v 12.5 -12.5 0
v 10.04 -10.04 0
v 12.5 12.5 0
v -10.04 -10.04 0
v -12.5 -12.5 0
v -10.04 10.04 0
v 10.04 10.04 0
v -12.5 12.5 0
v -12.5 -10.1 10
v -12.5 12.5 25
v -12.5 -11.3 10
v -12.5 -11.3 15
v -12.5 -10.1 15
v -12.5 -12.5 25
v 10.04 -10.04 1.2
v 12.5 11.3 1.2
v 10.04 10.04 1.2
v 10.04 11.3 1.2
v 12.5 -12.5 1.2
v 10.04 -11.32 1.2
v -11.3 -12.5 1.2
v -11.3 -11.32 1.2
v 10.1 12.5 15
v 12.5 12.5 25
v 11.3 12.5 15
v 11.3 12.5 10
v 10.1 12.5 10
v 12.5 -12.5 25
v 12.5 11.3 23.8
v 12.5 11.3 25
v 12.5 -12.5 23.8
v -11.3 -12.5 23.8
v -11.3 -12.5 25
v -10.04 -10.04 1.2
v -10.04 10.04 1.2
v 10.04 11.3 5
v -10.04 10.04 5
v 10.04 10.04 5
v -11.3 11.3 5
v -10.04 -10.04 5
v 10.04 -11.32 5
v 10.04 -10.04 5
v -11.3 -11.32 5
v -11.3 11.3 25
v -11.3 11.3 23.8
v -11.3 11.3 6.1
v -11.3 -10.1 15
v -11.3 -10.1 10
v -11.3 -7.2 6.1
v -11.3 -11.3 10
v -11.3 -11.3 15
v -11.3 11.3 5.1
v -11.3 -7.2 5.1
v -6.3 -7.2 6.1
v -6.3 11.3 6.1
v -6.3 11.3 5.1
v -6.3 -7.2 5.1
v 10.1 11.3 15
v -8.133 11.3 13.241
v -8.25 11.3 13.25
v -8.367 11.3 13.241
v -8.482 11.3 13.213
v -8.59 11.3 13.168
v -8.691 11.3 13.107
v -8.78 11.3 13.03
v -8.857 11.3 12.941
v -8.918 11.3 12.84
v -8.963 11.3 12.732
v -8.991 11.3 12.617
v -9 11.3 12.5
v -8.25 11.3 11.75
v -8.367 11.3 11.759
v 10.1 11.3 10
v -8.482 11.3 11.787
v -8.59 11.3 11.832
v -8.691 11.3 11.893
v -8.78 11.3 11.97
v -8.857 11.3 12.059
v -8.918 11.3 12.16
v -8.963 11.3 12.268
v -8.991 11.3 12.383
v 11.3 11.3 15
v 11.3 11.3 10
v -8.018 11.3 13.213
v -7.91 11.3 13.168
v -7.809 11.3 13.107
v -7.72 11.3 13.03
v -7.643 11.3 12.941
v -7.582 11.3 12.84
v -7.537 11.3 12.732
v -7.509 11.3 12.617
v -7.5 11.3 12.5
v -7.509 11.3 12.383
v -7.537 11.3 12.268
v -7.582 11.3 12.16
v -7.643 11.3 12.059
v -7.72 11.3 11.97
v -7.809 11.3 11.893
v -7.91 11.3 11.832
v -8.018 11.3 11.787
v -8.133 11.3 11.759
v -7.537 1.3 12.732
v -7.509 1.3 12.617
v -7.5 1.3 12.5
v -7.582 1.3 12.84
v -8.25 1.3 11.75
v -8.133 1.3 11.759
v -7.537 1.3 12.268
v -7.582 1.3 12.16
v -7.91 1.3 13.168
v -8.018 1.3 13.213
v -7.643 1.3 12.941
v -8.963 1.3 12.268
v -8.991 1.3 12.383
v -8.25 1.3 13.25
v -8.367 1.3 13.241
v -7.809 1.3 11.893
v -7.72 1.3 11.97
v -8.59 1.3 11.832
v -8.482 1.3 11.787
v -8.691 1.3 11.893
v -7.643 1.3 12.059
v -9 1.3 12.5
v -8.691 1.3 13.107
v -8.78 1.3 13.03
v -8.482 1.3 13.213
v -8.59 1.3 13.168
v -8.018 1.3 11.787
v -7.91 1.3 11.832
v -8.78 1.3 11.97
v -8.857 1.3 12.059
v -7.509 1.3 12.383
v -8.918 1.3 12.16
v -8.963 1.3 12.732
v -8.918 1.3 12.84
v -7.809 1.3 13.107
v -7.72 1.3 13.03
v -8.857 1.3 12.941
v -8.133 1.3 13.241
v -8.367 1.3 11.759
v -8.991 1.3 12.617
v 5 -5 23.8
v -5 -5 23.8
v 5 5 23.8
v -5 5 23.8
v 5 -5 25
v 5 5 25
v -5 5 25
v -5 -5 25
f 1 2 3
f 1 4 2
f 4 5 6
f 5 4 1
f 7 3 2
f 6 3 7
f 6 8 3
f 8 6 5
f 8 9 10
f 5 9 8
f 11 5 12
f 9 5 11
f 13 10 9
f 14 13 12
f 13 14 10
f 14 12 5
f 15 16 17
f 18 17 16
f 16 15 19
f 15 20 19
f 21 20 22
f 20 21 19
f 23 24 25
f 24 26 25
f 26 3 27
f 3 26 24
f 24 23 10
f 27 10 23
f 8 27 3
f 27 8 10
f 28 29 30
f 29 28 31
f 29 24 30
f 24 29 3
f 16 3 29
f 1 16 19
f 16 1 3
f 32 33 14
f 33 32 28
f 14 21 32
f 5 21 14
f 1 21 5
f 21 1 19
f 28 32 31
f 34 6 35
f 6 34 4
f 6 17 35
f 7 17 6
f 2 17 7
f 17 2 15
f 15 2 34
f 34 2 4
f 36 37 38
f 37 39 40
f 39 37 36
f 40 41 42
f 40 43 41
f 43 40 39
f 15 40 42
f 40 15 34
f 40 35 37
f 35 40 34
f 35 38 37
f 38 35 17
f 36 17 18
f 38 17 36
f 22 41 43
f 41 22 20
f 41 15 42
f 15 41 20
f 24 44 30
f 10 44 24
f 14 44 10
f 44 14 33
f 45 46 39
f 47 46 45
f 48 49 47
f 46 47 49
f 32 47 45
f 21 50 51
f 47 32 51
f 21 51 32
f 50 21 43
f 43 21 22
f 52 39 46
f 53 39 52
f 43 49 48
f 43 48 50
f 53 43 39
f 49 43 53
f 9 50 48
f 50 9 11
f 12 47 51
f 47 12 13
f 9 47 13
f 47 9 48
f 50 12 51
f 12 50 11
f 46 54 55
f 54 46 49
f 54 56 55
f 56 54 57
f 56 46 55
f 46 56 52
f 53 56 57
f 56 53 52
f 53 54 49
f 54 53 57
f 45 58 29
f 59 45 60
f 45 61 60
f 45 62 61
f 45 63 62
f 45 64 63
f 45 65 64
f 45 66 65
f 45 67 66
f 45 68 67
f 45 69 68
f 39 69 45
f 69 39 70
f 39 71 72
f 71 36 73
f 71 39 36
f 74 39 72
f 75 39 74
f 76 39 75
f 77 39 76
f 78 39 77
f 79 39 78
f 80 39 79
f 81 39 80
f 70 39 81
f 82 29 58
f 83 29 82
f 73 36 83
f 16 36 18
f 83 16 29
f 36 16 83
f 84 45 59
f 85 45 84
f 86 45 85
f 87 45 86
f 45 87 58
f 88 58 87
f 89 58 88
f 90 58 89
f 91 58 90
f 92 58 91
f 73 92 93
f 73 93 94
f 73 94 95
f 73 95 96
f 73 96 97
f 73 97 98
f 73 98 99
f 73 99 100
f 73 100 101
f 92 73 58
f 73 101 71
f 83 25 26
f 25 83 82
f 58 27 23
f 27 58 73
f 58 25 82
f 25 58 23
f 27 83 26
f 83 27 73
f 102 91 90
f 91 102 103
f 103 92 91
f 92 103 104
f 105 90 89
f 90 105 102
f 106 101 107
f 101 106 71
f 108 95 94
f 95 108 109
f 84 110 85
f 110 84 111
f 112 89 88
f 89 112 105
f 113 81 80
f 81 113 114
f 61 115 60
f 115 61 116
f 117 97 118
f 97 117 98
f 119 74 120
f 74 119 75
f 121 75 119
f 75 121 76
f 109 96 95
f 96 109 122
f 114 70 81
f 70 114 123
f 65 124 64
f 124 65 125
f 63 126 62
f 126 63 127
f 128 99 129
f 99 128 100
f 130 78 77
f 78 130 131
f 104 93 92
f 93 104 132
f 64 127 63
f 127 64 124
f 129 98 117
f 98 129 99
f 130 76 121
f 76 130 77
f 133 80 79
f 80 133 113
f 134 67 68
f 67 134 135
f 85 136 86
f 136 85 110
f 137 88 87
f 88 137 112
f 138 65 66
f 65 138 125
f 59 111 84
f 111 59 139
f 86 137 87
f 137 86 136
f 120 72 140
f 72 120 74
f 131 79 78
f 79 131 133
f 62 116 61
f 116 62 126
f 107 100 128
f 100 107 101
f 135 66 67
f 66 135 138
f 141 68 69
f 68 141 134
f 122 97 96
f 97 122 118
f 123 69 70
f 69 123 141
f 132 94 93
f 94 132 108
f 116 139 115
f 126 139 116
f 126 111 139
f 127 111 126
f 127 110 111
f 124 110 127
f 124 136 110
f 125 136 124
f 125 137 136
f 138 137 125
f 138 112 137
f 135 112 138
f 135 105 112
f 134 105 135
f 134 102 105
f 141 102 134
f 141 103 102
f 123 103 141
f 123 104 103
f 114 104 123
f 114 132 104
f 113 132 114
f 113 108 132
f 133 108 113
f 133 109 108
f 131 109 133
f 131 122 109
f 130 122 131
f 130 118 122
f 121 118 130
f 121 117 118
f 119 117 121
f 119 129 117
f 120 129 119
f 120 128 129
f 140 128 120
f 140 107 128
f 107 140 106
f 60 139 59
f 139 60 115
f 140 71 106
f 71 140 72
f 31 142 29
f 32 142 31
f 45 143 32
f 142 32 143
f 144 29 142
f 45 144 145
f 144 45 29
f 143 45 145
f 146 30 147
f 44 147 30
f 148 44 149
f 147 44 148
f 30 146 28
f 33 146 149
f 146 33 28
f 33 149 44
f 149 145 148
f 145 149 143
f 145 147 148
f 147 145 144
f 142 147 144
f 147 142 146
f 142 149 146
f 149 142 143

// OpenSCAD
// ============================================================
// 하우징 Peltier v2 - box 조립 (Peltier 면 + -X쪽 면 + +Y쪽 면 + +Z쪽 면)
// Peltier 면(바닥): 25x25mm, 사각 링(프레임)이 바닥판 위로 3.8mm 돌출, 안쪽은 관통 구멍
// -X쪽 면: Peltier 면의 -X쪽 가장자리에 수직으로 세움 (평면 기준 90도 회전 후 부착), 리브 5mm 돌출
// +Y쪽 면 / +Z쪽 면(윗면): 패턴 없는 평판, 크기/두께는 나머지 두 면과 동일
//
// closure1/closure2는 housing_peltier_closure1_v2.scad / housing_peltier_closure2_v2.scad로 분리됨.
// ============================================================

// ---------------- Peltier 면 (바닥) ----------------
module peltier_v2_face() {
    face_size = 25;   // 면의 가로/세로 (정사각형)
    housing_t = 1.2;  // 하우징 두께 (사방 테두리)

    frame_w = 1.28;   // 사각 링(프레임) 벽 두께 (변경 없음)
    sq_size = 20.08;  // 프레임 안쪽 정사각형 (Peltier 안착 공간, 관통 구멍) - 20.04에서 0.04mm 증가
    ring_z  = 3.8;    // 사각 링 Z방향 돌출 높이

    inner_size = face_size - 2 * housing_t; // 22.6mm (하우징 안쪽 치수)
    ring_outer = sq_size + 2 * frame_w;     // 22.64mm (sq_size와 함께 0.04mm 증가, frame_w는 그대로)

    echo("[Peltier_v2] ring_outer =", ring_outer, " sq_size =", sq_size);

    // 바닥판 (실제 3D, 두께 1.2mm). 사각 링 안쪽(20.08x20.08)은 관통 구멍.
    color("gray")
        difference() {
            linear_extrude(height = housing_t)
                square([face_size, face_size], center = true);
            translate([0, 0, -0.1])
                linear_extrude(height = housing_t + 0.2)
                    square([sq_size, sq_size], center = true);
        }

    // 사각 링(프레임): 중앙에 20.08x20.08 정사각형 안착 공간이 생김.
    // 바닥판 위로 ring_z만큼 돌출. X축 양수방향 벽은 제거되어 열려있음.
    color("SteelBlue")
        translate([0, 0, housing_t])
            linear_extrude(height = ring_z)
                difference() {
                    difference() {
                        square([ring_outer, ring_outer], center = true);
                        square([sq_size, sq_size], center = true);
                    }
                    // X축 양수방향 벽 제거
                    translate([sq_size / 2, -ring_outer / 2 - 0.1])
                        square([ring_outer / 2 - sq_size / 2 + 0.2, ring_outer + 0.2]);
                }
}

// ---------------- -X쪽 면 (리브 있는 면) ----------------
module peltier_left_v2_face() {
    face_size = 25;   // 면의 가로/세로 (정사각형, Peltier 면과 동일)
    housing_t = 1.2;  // 하우징 두께 (위/아래/좌/우 테두리)

    rib_w   = 1;      // 리브 두께 (X방향)
    rib_len = 18.5;   // 리브 길이 (Y방향)
    rib_z   = 5;      // 리브 Z방향 돌출 높이

    // Y축 음수방향 모서리에서 Y축 양수 방향으로 1.2mm 떨어진 5x1.2mm 관통 구멍
    hole_w = 5;   // X방향
    hole_h = 1.2; // Y방향
    hole_gap = 1.2; // -Y쪽 모서리 - 구멍 사이 거리

    // 리브를 Peltier 면(바닥, world Z=0)에서 world Z축 양수방향으로 5.6mm 위치(중심)로 이동.
    // 리브 아래쪽 면(world Z = rib_world_z - rib_w/2)이 바닥에서 5.1mm 떨어지도록 함.
    // 이 벽의 부착 변환에서는 로컬 X가 world Z(높이)에 대응하므로,
    // rib_center_x = face_size/2 - rib_world_z 로 계산.
    rib_world_z = 5.6; // Peltier 면 기준 world Z 위치 (리브 중심)

    // Y축: 리브 위쪽 끝이 안쪽 위쪽 모서리(위쪽 테두리 안쪽)에 닿음
    y_inner_top    = face_size / 2 - housing_t;  // 안쪽 위쪽 테두리 (11.3)
    y_inner_bottom = -face_size / 2 + housing_t; // 안쪽 아래쪽 테두리 (-11.3)
    rib_bottom     = y_inner_top - rib_len;      // 리브 아래쪽 끝
    gap_bottom_check = rib_bottom - y_inner_bottom; // 4.1mm 이어야 함

    rib_center_y = (y_inner_top + rib_bottom) / 2;
    rib_center_x = face_size / 2 - rib_world_z;

    // 리브의 world Z 방향 위/아래 면과 각 끝(바닥 Z=0, 벽 꼭대기 Z=face_size)까지의 거리
    rib_z_bottom_face = rib_world_z - rib_w / 2; // 바닥까지 거리 (5.1이어야 함)
    rib_z_top_face    = rib_world_z + rib_w / 2; // 리브 위쪽 면 world Z 위치
    rib_z_top_gap     = face_size - rib_z_top_face; // 반대쪽(벽 꼭대기)까지 거리

    echo("[PeltierLeft_v2] gap_bottom check =", gap_bottom_check, " (should be 4.1)");
    echo("[PeltierLeft_v2] rib world Z =", face_size / 2 - rib_center_x, " (should be", rib_world_z, ")");
    echo("[PeltierLeft_v2] rib_z_bottom_face =", rib_z_bottom_face, " (should be 5.1)");
    echo("[PeltierLeft_v2] rib_z_top_gap (반대쪽 면 간격) =", rib_z_top_gap);

    // 바닥판 (실제 3D, 두께 1.2mm). -Y쪽 모서리에서 1.2mm 떨어진 5x1.2mm 관통 구멍.
    color("gray")
        difference() {
            linear_extrude(height = housing_t)
                square([face_size, face_size], center = true);
            translate([-hole_w / 2, -face_size / 2 + hole_gap, -0.1])
                cube([hole_w, hole_h, housing_t + 0.2]);
        }

    // 리브 (실제 3D, 바닥판 위에 Z 깊이 rib_z 추가)
    color("SteelBlue")
        translate([0, 0, housing_t])
            linear_extrude(height = rib_z)
                translate([rib_center_x, rib_center_y])
                    square([rib_w, rib_len], center = true);
}

// ---------------- +Y쪽 면 (X축 양수방향 모서리에 구멍) ----------------
// 크기와 두께는 Peltier 면 / -X쪽 면과 동일 (25x25mm, 1.2mm 두께).
module peltier_y_pos_v2_face() {
    face_size = 25;
    housing_t = 1.2;

    // X축 양수방향 모서리에서 X축 음수 방향으로 1.2mm 떨어진 5x1.2mm 관통 구멍
    hole_w = 1.2; // X방향
    hole_h = 5;   // Y방향
    hole_gap = 1.2; // +X쪽 모서리 - 구멍 사이 거리

    color("gray")
        difference() {
            linear_extrude(height = housing_t)
                square([face_size, face_size], center = true);
            translate([face_size / 2 - hole_gap - hole_w, -hole_h / 2, -0.1])
                cube([hole_w, hole_h, housing_t + 0.2]);
        }

    // 원기둥: 지름 1.5mm, 길이 10mm. -X쪽 면(립 있는 면)의 안쪽 면 기준 3.05mm 떨어진 위치.
    // world -Y 방향(캐비티 쪽)으로 돌출, 높이는 벽 중앙.
    pin_d = 1.5;
    pin_len = 10;
    pin_x = -face_size / 2 + housing_t + 3.05; // -8.25

    echo("[PeltierYPos_v2] pin_x =", pin_x);

    color("SteelBlue")
        translate([pin_x, 0, housing_t])
            cylinder(d = pin_d, h = pin_len, $fn = 40);
}

// ---------------- +Z쪽 면 (윗면, 정가운데 10x10 정사각형 구멍) ----------------
// 크기와 두께는 Peltier 면 / -X쪽 면과 동일 (25x25mm, 1.2mm 두께).
module peltier_top_v2_face() {
    face_size = 25;
    housing_t = 1.2;
    sq_size   = 10; // 정가운데 정사각형 구멍 한 변

    color("gray")
        difference() {
            linear_extrude(height = housing_t)
                square([face_size, face_size], center = true);
            translate([0, 0, -0.1])
                linear_extrude(height = housing_t + 0.2)
                    square([sq_size, sq_size], center = true);
        }
}

// ---------------- 조립 ----------------
peltier_v2_face();

// -X쪽 면을 Peltier 면의 -X쪽 가장자리(x=-12.5)에 수직으로 세움.
// 이 변환(rotate 90/90/-90 조합)에서는 로컬 X -> world Z(높이), 로컬 Y -> world Y(깊이),
// 로컬 Z(리브 돌출) -> world +X 로 대응됨.
// left_v2_face(housing_erm_v2)와 동일한 부착 방식: 평면 기준 90도 회전 후 부착.
translate([-12.5, 0, 12.5])
    rotate([0, 0, 90])
        rotate([90, 0, 0])
            rotate([0, 0, -90])
                peltier_left_v2_face();

// +Y쪽 면을 Peltier 면의 +Y쪽 가장자리(y=12.5)에 수직으로 세움.
translate([0, 12.5, 12.5])
    rotate([90, 0, 0])
        peltier_y_pos_v2_face();

// +Z쪽 면(윗면)을 Peltier 면 위(z=23.8~25)에 평행하게 덮음.
translate([0, 0, 23.8])
    peltier_top_v2_face();
